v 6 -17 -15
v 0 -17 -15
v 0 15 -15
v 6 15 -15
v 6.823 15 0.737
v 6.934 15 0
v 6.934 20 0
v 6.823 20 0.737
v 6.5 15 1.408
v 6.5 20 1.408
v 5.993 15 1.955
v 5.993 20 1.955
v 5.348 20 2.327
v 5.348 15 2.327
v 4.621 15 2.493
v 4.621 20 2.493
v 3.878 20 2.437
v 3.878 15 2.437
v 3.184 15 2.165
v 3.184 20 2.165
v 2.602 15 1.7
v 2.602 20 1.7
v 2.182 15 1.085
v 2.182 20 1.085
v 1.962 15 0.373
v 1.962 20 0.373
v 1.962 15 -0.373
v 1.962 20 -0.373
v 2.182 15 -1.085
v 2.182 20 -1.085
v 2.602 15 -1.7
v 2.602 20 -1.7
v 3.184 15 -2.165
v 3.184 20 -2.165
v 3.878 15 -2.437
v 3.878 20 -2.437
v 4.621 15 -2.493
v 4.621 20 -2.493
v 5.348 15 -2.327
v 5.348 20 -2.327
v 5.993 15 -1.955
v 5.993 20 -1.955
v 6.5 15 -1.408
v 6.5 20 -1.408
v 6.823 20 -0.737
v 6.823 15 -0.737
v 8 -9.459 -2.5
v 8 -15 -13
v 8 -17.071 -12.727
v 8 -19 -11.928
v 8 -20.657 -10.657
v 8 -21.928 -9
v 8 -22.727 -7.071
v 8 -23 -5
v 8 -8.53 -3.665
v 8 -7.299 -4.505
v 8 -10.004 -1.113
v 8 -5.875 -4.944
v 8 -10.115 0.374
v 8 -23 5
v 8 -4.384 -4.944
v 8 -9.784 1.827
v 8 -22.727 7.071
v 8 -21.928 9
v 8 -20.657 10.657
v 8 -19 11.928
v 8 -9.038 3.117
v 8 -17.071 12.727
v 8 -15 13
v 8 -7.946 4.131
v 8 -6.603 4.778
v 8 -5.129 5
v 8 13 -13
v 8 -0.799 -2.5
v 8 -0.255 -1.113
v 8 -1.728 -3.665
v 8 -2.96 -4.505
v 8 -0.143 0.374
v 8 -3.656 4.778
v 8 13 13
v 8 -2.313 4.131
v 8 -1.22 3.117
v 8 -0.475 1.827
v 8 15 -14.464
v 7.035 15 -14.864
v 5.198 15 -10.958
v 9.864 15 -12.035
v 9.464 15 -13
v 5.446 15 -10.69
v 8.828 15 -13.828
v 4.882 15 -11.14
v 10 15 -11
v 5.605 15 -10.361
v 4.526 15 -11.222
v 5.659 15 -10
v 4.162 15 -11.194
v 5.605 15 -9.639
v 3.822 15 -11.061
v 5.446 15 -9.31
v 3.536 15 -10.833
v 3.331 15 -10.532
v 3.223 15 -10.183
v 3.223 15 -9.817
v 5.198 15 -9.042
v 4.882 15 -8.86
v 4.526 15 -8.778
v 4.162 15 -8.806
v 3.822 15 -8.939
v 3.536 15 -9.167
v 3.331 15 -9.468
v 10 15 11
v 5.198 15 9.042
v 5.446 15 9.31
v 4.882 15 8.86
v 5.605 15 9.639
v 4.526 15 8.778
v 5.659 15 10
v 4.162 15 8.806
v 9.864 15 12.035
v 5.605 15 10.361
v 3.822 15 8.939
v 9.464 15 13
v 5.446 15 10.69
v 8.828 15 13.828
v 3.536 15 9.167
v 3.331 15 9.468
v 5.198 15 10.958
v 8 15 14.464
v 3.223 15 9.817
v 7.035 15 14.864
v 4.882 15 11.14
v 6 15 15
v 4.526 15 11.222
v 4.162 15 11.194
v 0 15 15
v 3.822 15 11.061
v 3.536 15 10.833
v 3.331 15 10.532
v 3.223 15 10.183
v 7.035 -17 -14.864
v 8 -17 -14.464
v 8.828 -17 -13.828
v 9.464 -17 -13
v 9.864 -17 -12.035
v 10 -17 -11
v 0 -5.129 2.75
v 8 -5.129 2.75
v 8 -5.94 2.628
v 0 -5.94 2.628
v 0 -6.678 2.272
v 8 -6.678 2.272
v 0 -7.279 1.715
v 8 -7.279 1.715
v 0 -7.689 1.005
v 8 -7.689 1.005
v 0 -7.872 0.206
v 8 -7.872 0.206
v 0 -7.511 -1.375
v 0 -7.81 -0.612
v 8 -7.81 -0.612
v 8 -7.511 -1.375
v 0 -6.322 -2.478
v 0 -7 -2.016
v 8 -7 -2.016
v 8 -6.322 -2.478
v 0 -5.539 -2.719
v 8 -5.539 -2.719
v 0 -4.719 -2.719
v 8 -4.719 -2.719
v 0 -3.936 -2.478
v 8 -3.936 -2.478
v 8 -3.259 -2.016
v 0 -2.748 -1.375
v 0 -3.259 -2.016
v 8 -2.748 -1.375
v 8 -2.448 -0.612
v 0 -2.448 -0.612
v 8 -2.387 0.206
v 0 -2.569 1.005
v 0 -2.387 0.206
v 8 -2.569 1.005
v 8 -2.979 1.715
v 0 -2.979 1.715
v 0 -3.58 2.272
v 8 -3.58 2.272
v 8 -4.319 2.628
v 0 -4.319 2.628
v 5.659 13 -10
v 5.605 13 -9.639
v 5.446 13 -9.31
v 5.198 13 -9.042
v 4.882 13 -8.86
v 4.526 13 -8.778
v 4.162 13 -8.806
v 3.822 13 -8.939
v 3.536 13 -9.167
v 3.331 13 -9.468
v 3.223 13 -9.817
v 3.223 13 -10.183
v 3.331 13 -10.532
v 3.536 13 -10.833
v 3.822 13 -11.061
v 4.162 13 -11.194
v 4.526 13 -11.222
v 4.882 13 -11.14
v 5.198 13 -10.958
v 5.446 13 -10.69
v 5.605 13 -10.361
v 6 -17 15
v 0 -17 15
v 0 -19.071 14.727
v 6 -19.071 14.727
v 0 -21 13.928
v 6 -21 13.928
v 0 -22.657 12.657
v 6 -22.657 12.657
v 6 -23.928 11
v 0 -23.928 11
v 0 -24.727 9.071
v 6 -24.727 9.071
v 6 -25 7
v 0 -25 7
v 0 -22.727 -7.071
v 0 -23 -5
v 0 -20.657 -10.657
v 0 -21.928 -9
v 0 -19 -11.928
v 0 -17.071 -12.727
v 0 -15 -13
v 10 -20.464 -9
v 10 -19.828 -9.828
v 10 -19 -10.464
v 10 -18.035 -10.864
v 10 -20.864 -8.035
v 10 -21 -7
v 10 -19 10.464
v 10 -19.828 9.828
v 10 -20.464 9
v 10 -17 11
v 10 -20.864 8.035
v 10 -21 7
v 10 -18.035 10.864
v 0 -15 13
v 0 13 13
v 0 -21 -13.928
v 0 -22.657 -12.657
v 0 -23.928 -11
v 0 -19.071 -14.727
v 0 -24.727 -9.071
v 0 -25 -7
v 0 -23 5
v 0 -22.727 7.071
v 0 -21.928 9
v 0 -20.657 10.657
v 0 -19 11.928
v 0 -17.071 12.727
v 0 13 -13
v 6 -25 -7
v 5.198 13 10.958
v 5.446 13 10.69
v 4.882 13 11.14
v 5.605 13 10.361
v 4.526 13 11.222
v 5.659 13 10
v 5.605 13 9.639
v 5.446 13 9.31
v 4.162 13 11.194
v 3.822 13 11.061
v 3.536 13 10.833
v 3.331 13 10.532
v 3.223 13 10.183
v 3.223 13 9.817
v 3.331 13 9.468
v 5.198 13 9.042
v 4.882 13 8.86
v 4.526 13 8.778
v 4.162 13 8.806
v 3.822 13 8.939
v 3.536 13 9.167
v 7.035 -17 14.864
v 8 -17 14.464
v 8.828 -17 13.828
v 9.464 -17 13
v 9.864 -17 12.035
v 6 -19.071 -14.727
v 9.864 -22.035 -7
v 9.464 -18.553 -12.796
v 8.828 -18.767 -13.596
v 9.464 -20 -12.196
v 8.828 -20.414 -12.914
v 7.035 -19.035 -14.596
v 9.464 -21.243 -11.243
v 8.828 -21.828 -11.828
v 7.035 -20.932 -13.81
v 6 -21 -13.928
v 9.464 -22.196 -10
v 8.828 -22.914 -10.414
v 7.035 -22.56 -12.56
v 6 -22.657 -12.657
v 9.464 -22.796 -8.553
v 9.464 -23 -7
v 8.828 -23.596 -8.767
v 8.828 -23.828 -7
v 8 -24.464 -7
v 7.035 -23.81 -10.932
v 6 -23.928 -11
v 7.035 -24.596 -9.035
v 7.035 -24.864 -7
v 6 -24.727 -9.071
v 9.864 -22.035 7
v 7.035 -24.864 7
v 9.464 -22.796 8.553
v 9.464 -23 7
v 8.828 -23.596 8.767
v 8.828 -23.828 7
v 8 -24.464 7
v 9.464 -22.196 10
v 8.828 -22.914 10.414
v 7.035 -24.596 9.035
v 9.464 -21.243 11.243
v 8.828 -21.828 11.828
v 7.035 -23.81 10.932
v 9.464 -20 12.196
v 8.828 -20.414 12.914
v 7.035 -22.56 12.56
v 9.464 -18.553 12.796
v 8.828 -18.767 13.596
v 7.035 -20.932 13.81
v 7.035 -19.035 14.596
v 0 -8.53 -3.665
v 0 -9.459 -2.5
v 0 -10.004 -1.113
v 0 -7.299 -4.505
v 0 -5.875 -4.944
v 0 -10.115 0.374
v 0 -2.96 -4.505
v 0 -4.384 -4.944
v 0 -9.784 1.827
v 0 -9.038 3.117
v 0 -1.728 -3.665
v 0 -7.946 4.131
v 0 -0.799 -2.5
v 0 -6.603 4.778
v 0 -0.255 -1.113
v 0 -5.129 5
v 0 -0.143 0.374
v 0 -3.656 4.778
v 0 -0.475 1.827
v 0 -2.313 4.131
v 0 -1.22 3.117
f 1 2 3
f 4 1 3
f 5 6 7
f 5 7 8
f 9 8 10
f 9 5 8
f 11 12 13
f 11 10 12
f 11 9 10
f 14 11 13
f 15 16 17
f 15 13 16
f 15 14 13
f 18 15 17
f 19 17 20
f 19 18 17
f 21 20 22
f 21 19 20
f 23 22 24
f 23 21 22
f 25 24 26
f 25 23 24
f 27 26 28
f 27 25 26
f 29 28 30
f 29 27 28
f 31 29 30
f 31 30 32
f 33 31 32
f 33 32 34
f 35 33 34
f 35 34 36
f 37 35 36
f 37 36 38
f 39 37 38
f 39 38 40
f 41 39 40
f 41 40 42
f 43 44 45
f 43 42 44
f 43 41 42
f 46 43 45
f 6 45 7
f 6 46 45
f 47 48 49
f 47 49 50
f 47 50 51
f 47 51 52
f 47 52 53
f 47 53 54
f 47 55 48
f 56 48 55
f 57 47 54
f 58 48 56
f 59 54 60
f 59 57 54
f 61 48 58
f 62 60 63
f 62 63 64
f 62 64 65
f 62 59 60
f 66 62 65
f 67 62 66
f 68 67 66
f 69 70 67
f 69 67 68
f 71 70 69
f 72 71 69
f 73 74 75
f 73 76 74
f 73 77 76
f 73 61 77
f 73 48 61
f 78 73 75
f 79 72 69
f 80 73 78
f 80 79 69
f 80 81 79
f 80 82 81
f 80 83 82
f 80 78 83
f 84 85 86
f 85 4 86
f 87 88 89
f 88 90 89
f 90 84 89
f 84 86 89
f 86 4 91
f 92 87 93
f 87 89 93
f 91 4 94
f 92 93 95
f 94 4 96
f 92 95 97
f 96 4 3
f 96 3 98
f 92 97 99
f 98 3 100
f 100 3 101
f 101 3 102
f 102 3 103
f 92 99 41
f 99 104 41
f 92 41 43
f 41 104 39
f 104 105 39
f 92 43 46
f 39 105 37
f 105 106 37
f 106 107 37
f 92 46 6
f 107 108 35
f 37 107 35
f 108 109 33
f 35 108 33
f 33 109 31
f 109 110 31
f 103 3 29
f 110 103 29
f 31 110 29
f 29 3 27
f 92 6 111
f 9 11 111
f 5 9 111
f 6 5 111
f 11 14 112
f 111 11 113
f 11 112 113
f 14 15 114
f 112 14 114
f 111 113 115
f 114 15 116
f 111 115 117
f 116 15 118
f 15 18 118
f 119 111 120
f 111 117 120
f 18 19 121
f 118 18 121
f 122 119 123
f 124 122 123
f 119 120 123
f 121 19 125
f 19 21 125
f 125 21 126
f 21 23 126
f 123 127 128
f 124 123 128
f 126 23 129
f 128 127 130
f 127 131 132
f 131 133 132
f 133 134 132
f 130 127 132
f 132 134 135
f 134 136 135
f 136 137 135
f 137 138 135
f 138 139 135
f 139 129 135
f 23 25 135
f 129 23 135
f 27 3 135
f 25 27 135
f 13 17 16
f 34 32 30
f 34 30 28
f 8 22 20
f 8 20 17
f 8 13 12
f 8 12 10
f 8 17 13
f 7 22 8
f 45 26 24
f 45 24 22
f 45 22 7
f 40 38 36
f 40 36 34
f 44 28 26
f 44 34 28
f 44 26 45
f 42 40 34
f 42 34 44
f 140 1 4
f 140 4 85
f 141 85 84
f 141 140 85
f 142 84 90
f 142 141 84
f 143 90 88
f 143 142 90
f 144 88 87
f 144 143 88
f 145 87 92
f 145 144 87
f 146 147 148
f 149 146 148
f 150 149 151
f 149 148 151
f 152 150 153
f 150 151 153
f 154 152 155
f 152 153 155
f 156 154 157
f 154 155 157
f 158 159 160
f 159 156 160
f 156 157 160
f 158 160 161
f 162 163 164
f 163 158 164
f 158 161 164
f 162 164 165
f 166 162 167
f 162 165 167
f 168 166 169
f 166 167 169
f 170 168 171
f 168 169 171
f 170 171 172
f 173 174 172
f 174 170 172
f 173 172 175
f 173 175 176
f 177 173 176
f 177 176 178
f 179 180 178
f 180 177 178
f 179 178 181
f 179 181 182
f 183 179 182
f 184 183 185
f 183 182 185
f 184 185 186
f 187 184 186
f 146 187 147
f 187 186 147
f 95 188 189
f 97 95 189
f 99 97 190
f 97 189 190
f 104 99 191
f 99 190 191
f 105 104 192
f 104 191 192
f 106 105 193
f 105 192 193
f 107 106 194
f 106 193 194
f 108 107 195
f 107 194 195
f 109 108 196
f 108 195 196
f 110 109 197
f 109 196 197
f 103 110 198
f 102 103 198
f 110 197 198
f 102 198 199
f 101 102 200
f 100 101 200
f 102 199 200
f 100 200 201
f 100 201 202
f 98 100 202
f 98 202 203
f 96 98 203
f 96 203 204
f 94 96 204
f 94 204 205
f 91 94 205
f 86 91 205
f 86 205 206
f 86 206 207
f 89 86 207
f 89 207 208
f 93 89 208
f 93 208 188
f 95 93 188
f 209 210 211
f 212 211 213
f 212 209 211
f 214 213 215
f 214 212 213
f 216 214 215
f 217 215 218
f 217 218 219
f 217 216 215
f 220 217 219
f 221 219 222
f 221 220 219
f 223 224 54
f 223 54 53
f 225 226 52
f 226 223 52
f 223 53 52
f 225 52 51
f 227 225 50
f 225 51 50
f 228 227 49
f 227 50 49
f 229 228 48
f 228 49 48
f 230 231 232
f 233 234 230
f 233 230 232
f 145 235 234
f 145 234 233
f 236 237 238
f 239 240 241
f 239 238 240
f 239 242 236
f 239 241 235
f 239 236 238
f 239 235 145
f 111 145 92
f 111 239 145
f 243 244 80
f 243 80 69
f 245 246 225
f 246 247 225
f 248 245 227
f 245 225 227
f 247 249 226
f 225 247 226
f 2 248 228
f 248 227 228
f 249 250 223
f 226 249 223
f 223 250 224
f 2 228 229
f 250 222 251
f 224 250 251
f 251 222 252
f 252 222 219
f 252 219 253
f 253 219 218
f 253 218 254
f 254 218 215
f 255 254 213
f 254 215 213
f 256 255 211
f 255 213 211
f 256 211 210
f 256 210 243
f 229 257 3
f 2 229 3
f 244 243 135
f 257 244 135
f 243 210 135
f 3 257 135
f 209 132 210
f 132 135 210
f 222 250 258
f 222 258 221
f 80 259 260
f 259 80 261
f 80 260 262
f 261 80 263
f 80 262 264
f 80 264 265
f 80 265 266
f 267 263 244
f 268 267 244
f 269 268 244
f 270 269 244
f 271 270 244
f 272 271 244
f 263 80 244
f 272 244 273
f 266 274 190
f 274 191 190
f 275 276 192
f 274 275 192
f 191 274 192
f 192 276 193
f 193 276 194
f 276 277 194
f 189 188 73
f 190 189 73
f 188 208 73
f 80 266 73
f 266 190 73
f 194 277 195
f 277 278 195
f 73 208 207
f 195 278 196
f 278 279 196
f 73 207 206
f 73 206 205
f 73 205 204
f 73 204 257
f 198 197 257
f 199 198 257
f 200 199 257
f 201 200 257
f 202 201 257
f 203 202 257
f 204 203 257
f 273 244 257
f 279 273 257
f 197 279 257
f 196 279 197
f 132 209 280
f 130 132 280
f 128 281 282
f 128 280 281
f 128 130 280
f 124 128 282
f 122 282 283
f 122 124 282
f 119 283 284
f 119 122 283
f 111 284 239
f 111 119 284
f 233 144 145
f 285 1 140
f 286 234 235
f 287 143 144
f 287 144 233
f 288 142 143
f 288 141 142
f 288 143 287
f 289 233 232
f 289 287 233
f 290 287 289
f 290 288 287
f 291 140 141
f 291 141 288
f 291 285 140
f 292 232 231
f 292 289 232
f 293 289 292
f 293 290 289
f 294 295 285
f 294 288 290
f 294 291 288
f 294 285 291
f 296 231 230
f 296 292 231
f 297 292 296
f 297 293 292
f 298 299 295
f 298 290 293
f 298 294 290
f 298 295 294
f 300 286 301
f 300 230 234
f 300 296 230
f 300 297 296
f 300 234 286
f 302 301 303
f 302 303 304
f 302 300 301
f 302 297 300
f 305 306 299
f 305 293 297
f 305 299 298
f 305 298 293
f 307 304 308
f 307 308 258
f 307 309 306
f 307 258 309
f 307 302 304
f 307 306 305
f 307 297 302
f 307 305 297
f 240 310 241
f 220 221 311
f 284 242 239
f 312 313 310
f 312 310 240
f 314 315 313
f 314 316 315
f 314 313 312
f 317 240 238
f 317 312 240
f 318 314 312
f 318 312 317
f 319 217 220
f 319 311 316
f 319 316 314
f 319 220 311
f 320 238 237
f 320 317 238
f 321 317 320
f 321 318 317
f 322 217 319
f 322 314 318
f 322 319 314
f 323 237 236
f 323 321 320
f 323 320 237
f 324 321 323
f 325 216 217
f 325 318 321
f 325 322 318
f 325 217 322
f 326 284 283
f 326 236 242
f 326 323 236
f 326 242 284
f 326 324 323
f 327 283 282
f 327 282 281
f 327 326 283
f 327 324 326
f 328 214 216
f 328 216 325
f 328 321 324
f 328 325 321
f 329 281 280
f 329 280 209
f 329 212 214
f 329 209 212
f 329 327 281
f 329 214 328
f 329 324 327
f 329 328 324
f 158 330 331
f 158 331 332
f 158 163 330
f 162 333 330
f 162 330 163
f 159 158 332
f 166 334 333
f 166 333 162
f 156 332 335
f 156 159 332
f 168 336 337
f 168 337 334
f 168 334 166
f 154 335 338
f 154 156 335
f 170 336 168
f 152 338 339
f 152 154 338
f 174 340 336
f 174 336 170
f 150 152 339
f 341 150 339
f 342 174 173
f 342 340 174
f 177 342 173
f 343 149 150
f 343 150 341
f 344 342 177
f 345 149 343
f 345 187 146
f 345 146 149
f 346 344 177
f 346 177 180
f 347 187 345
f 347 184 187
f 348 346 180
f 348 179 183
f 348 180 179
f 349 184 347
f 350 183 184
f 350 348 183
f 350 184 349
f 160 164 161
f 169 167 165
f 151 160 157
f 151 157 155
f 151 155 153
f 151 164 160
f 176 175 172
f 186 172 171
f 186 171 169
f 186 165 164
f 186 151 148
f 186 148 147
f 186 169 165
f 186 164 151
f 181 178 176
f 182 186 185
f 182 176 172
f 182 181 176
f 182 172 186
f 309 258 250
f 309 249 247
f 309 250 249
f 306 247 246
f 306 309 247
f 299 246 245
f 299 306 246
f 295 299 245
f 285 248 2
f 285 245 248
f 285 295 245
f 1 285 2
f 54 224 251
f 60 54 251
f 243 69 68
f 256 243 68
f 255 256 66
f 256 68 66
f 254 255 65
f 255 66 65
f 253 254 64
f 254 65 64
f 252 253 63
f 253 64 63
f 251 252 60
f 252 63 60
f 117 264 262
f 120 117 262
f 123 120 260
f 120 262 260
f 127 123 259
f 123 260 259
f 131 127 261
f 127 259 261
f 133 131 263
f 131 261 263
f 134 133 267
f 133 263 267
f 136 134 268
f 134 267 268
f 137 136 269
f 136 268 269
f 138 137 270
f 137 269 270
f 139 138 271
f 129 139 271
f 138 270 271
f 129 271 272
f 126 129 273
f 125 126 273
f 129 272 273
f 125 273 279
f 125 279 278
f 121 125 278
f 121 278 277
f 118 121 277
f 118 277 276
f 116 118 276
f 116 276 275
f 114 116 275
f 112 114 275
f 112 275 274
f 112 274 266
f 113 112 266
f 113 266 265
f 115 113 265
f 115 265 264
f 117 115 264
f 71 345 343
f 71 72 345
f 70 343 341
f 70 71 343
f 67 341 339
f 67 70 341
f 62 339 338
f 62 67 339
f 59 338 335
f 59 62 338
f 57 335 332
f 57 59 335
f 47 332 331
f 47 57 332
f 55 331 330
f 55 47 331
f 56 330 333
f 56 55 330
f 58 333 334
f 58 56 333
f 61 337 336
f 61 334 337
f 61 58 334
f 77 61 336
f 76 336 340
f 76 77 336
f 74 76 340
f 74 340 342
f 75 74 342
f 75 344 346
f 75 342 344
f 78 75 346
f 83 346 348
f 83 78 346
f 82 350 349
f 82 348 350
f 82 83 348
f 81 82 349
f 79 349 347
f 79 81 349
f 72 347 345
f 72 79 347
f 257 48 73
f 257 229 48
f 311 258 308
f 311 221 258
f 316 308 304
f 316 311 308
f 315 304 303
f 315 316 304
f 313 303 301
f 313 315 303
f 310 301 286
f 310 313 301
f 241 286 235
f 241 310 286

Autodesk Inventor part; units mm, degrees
ref_plane "YZ Plane" through (0, 0, 0) normal (1, 0, 0) x (0, 1, 0)
ref_plane "XZ Plane" through (0, 0, 0) normal (0, 1, 0) x (-1, 0, 0)
ref_plane "XY Plane" through (0, 0, 0) normal (0, 0, 1) x (1, 0, 0)
sketch "Sketch1" plane through (0, 0, 0) normal (1, 0, 0) x (0, 1, 0)
  line L0 (15, 15) -> (-15, 15)
  line L1 (-15, -15) -> (15, -15)
  line L2 (15, -15) -> (15, 15)
  line L3 (15, 15) -> (-15, -15) construction
  line L4 (-15, 15) -> (15, -15) construction
  line L5 (-15, -15) -> (-25, -15)
  line L6 (-25, -15) -> (-25, 15)
  line L7 (-25, 15) -> (-15, 15)
  point P0 (0, 0)
  dimension "d0" = 30
  dimension "d1" = 30
  dimension "d13" = 10
extrude "Extrusion1" add sketch "Sketch1" along normal blind 10
sketch "Sketch2" plane through (0, 0, 0) normal (-1, 0, 0) x (0, 0, 1)
  line L0 (-13, -13) -> (-13, 13)
  line L1 (13, 13) -> (13, -13)
  line L2 (13, 13) -> (-13, 13)
  line L3 (-13, -13) -> (-13, -23)
  line L4 (-13, -23) -> (13, -23)
  line L5 (13, -23) -> (13, -13)
  point P0 (0, 0)
  dimension "d14" = 10
extrude "Extrusion2" cut sketch "Sketch2" against normal blind 8
sketch "Sketch3" plane through (0, 15, 15) normal (0, 1, 0) x (1, 0, 0)
  circle A0 centre (4.4342, 15) radius 2.5 projected
  point P0 (0, 15)
extrude "Extrusion3" add sketch "Sketch3" along normal blind 5
sketch "Sketch4" plane through (0, 13, -13) normal (0, -1, 0) x (1, 0, 0)
  circle A0 centre (4.4342, 23) radius 1.225 projected
  circle A1 centre (4.4342, 3) radius 1.225 projected
  point P0 (0, 13)
extrude "Extrusion4" cut sketch "Sketch4" against normal blind 2
fillet "Fillet4" radius 8 4 edges at (4, -23, 13) (4, -23, -13) (5, -25, -15) (5, -25, 15)
fillet "Fillet5" radius 4 4 edges at (10, -25, 0) (10, -22.6569, 12.6569) (10, -1, -15) (10, -22.6569, -12.6569)
sketch "Sketch11" plane through (8, 0, 0) normal (-1, 0, 0) x (0, 0, 1)
  circle A0 centre (0, -5.1293) radius 5
  circle A1 centre (0, -5.1293) radius 2.75
  point P0 (0, 0)
  dimension "d48" = 10
extrude "Extrusion13" add sketch "Sketch11" along normal blind 8
properties part number "TapaPieEfector"
